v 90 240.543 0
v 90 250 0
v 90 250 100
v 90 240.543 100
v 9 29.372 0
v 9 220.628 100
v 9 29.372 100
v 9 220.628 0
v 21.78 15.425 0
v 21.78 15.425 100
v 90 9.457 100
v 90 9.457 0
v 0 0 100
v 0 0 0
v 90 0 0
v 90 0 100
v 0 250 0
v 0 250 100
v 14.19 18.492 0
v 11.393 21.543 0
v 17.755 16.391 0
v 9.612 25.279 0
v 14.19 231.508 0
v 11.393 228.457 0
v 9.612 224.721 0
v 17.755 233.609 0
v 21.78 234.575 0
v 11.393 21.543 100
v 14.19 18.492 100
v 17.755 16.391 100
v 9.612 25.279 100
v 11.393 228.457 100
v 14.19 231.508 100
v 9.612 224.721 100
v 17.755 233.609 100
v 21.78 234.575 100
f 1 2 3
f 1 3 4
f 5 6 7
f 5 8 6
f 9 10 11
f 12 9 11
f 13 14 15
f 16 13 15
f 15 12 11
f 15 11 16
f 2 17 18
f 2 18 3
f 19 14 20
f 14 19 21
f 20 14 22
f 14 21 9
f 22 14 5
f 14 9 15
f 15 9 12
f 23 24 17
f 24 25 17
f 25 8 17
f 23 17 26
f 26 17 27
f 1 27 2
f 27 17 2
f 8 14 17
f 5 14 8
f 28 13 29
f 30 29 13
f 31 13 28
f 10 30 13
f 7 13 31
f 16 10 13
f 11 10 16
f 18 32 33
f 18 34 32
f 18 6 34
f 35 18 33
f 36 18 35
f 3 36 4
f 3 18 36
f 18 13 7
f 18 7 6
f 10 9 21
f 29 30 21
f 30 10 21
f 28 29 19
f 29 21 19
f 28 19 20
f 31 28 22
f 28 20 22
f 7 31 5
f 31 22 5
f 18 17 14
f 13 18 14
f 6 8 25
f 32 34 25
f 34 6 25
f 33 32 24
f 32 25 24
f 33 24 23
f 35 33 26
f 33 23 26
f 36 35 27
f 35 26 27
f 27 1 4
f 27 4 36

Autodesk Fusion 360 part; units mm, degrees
sketch "スケッチ1" plane through (0, 0, 0) normal (0, 0, 1) x (1, 0, 0)
  arc A0 (21.7798, 234.5748) -> (9, 220.6281) centre (23, 220.6281) ccw
  line L0 (0, 250) -> (0, 0)
  line L1 (0, 0) -> (90, 0)
  line L2 (21.7798, 15.4252) -> (90, 9.4567)
  line L3 (9, 220.6281) -> (9, 29.3719)
  arc A1 (9, 29.3719) -> (21.7798, 15.4252) centre (23, 29.3719) ccw
  line L4 (90, 9.4567) -> (90, 0)
  line L5 (90, 240.5433) -> (21.7798, 234.5748)
  line L6 (0, 250) -> (90, 250)
  line L7 (90, 250) -> (90, 240.5433)
extrude "押し出し1" add sketch "スケッチ1" along normal blind 100
